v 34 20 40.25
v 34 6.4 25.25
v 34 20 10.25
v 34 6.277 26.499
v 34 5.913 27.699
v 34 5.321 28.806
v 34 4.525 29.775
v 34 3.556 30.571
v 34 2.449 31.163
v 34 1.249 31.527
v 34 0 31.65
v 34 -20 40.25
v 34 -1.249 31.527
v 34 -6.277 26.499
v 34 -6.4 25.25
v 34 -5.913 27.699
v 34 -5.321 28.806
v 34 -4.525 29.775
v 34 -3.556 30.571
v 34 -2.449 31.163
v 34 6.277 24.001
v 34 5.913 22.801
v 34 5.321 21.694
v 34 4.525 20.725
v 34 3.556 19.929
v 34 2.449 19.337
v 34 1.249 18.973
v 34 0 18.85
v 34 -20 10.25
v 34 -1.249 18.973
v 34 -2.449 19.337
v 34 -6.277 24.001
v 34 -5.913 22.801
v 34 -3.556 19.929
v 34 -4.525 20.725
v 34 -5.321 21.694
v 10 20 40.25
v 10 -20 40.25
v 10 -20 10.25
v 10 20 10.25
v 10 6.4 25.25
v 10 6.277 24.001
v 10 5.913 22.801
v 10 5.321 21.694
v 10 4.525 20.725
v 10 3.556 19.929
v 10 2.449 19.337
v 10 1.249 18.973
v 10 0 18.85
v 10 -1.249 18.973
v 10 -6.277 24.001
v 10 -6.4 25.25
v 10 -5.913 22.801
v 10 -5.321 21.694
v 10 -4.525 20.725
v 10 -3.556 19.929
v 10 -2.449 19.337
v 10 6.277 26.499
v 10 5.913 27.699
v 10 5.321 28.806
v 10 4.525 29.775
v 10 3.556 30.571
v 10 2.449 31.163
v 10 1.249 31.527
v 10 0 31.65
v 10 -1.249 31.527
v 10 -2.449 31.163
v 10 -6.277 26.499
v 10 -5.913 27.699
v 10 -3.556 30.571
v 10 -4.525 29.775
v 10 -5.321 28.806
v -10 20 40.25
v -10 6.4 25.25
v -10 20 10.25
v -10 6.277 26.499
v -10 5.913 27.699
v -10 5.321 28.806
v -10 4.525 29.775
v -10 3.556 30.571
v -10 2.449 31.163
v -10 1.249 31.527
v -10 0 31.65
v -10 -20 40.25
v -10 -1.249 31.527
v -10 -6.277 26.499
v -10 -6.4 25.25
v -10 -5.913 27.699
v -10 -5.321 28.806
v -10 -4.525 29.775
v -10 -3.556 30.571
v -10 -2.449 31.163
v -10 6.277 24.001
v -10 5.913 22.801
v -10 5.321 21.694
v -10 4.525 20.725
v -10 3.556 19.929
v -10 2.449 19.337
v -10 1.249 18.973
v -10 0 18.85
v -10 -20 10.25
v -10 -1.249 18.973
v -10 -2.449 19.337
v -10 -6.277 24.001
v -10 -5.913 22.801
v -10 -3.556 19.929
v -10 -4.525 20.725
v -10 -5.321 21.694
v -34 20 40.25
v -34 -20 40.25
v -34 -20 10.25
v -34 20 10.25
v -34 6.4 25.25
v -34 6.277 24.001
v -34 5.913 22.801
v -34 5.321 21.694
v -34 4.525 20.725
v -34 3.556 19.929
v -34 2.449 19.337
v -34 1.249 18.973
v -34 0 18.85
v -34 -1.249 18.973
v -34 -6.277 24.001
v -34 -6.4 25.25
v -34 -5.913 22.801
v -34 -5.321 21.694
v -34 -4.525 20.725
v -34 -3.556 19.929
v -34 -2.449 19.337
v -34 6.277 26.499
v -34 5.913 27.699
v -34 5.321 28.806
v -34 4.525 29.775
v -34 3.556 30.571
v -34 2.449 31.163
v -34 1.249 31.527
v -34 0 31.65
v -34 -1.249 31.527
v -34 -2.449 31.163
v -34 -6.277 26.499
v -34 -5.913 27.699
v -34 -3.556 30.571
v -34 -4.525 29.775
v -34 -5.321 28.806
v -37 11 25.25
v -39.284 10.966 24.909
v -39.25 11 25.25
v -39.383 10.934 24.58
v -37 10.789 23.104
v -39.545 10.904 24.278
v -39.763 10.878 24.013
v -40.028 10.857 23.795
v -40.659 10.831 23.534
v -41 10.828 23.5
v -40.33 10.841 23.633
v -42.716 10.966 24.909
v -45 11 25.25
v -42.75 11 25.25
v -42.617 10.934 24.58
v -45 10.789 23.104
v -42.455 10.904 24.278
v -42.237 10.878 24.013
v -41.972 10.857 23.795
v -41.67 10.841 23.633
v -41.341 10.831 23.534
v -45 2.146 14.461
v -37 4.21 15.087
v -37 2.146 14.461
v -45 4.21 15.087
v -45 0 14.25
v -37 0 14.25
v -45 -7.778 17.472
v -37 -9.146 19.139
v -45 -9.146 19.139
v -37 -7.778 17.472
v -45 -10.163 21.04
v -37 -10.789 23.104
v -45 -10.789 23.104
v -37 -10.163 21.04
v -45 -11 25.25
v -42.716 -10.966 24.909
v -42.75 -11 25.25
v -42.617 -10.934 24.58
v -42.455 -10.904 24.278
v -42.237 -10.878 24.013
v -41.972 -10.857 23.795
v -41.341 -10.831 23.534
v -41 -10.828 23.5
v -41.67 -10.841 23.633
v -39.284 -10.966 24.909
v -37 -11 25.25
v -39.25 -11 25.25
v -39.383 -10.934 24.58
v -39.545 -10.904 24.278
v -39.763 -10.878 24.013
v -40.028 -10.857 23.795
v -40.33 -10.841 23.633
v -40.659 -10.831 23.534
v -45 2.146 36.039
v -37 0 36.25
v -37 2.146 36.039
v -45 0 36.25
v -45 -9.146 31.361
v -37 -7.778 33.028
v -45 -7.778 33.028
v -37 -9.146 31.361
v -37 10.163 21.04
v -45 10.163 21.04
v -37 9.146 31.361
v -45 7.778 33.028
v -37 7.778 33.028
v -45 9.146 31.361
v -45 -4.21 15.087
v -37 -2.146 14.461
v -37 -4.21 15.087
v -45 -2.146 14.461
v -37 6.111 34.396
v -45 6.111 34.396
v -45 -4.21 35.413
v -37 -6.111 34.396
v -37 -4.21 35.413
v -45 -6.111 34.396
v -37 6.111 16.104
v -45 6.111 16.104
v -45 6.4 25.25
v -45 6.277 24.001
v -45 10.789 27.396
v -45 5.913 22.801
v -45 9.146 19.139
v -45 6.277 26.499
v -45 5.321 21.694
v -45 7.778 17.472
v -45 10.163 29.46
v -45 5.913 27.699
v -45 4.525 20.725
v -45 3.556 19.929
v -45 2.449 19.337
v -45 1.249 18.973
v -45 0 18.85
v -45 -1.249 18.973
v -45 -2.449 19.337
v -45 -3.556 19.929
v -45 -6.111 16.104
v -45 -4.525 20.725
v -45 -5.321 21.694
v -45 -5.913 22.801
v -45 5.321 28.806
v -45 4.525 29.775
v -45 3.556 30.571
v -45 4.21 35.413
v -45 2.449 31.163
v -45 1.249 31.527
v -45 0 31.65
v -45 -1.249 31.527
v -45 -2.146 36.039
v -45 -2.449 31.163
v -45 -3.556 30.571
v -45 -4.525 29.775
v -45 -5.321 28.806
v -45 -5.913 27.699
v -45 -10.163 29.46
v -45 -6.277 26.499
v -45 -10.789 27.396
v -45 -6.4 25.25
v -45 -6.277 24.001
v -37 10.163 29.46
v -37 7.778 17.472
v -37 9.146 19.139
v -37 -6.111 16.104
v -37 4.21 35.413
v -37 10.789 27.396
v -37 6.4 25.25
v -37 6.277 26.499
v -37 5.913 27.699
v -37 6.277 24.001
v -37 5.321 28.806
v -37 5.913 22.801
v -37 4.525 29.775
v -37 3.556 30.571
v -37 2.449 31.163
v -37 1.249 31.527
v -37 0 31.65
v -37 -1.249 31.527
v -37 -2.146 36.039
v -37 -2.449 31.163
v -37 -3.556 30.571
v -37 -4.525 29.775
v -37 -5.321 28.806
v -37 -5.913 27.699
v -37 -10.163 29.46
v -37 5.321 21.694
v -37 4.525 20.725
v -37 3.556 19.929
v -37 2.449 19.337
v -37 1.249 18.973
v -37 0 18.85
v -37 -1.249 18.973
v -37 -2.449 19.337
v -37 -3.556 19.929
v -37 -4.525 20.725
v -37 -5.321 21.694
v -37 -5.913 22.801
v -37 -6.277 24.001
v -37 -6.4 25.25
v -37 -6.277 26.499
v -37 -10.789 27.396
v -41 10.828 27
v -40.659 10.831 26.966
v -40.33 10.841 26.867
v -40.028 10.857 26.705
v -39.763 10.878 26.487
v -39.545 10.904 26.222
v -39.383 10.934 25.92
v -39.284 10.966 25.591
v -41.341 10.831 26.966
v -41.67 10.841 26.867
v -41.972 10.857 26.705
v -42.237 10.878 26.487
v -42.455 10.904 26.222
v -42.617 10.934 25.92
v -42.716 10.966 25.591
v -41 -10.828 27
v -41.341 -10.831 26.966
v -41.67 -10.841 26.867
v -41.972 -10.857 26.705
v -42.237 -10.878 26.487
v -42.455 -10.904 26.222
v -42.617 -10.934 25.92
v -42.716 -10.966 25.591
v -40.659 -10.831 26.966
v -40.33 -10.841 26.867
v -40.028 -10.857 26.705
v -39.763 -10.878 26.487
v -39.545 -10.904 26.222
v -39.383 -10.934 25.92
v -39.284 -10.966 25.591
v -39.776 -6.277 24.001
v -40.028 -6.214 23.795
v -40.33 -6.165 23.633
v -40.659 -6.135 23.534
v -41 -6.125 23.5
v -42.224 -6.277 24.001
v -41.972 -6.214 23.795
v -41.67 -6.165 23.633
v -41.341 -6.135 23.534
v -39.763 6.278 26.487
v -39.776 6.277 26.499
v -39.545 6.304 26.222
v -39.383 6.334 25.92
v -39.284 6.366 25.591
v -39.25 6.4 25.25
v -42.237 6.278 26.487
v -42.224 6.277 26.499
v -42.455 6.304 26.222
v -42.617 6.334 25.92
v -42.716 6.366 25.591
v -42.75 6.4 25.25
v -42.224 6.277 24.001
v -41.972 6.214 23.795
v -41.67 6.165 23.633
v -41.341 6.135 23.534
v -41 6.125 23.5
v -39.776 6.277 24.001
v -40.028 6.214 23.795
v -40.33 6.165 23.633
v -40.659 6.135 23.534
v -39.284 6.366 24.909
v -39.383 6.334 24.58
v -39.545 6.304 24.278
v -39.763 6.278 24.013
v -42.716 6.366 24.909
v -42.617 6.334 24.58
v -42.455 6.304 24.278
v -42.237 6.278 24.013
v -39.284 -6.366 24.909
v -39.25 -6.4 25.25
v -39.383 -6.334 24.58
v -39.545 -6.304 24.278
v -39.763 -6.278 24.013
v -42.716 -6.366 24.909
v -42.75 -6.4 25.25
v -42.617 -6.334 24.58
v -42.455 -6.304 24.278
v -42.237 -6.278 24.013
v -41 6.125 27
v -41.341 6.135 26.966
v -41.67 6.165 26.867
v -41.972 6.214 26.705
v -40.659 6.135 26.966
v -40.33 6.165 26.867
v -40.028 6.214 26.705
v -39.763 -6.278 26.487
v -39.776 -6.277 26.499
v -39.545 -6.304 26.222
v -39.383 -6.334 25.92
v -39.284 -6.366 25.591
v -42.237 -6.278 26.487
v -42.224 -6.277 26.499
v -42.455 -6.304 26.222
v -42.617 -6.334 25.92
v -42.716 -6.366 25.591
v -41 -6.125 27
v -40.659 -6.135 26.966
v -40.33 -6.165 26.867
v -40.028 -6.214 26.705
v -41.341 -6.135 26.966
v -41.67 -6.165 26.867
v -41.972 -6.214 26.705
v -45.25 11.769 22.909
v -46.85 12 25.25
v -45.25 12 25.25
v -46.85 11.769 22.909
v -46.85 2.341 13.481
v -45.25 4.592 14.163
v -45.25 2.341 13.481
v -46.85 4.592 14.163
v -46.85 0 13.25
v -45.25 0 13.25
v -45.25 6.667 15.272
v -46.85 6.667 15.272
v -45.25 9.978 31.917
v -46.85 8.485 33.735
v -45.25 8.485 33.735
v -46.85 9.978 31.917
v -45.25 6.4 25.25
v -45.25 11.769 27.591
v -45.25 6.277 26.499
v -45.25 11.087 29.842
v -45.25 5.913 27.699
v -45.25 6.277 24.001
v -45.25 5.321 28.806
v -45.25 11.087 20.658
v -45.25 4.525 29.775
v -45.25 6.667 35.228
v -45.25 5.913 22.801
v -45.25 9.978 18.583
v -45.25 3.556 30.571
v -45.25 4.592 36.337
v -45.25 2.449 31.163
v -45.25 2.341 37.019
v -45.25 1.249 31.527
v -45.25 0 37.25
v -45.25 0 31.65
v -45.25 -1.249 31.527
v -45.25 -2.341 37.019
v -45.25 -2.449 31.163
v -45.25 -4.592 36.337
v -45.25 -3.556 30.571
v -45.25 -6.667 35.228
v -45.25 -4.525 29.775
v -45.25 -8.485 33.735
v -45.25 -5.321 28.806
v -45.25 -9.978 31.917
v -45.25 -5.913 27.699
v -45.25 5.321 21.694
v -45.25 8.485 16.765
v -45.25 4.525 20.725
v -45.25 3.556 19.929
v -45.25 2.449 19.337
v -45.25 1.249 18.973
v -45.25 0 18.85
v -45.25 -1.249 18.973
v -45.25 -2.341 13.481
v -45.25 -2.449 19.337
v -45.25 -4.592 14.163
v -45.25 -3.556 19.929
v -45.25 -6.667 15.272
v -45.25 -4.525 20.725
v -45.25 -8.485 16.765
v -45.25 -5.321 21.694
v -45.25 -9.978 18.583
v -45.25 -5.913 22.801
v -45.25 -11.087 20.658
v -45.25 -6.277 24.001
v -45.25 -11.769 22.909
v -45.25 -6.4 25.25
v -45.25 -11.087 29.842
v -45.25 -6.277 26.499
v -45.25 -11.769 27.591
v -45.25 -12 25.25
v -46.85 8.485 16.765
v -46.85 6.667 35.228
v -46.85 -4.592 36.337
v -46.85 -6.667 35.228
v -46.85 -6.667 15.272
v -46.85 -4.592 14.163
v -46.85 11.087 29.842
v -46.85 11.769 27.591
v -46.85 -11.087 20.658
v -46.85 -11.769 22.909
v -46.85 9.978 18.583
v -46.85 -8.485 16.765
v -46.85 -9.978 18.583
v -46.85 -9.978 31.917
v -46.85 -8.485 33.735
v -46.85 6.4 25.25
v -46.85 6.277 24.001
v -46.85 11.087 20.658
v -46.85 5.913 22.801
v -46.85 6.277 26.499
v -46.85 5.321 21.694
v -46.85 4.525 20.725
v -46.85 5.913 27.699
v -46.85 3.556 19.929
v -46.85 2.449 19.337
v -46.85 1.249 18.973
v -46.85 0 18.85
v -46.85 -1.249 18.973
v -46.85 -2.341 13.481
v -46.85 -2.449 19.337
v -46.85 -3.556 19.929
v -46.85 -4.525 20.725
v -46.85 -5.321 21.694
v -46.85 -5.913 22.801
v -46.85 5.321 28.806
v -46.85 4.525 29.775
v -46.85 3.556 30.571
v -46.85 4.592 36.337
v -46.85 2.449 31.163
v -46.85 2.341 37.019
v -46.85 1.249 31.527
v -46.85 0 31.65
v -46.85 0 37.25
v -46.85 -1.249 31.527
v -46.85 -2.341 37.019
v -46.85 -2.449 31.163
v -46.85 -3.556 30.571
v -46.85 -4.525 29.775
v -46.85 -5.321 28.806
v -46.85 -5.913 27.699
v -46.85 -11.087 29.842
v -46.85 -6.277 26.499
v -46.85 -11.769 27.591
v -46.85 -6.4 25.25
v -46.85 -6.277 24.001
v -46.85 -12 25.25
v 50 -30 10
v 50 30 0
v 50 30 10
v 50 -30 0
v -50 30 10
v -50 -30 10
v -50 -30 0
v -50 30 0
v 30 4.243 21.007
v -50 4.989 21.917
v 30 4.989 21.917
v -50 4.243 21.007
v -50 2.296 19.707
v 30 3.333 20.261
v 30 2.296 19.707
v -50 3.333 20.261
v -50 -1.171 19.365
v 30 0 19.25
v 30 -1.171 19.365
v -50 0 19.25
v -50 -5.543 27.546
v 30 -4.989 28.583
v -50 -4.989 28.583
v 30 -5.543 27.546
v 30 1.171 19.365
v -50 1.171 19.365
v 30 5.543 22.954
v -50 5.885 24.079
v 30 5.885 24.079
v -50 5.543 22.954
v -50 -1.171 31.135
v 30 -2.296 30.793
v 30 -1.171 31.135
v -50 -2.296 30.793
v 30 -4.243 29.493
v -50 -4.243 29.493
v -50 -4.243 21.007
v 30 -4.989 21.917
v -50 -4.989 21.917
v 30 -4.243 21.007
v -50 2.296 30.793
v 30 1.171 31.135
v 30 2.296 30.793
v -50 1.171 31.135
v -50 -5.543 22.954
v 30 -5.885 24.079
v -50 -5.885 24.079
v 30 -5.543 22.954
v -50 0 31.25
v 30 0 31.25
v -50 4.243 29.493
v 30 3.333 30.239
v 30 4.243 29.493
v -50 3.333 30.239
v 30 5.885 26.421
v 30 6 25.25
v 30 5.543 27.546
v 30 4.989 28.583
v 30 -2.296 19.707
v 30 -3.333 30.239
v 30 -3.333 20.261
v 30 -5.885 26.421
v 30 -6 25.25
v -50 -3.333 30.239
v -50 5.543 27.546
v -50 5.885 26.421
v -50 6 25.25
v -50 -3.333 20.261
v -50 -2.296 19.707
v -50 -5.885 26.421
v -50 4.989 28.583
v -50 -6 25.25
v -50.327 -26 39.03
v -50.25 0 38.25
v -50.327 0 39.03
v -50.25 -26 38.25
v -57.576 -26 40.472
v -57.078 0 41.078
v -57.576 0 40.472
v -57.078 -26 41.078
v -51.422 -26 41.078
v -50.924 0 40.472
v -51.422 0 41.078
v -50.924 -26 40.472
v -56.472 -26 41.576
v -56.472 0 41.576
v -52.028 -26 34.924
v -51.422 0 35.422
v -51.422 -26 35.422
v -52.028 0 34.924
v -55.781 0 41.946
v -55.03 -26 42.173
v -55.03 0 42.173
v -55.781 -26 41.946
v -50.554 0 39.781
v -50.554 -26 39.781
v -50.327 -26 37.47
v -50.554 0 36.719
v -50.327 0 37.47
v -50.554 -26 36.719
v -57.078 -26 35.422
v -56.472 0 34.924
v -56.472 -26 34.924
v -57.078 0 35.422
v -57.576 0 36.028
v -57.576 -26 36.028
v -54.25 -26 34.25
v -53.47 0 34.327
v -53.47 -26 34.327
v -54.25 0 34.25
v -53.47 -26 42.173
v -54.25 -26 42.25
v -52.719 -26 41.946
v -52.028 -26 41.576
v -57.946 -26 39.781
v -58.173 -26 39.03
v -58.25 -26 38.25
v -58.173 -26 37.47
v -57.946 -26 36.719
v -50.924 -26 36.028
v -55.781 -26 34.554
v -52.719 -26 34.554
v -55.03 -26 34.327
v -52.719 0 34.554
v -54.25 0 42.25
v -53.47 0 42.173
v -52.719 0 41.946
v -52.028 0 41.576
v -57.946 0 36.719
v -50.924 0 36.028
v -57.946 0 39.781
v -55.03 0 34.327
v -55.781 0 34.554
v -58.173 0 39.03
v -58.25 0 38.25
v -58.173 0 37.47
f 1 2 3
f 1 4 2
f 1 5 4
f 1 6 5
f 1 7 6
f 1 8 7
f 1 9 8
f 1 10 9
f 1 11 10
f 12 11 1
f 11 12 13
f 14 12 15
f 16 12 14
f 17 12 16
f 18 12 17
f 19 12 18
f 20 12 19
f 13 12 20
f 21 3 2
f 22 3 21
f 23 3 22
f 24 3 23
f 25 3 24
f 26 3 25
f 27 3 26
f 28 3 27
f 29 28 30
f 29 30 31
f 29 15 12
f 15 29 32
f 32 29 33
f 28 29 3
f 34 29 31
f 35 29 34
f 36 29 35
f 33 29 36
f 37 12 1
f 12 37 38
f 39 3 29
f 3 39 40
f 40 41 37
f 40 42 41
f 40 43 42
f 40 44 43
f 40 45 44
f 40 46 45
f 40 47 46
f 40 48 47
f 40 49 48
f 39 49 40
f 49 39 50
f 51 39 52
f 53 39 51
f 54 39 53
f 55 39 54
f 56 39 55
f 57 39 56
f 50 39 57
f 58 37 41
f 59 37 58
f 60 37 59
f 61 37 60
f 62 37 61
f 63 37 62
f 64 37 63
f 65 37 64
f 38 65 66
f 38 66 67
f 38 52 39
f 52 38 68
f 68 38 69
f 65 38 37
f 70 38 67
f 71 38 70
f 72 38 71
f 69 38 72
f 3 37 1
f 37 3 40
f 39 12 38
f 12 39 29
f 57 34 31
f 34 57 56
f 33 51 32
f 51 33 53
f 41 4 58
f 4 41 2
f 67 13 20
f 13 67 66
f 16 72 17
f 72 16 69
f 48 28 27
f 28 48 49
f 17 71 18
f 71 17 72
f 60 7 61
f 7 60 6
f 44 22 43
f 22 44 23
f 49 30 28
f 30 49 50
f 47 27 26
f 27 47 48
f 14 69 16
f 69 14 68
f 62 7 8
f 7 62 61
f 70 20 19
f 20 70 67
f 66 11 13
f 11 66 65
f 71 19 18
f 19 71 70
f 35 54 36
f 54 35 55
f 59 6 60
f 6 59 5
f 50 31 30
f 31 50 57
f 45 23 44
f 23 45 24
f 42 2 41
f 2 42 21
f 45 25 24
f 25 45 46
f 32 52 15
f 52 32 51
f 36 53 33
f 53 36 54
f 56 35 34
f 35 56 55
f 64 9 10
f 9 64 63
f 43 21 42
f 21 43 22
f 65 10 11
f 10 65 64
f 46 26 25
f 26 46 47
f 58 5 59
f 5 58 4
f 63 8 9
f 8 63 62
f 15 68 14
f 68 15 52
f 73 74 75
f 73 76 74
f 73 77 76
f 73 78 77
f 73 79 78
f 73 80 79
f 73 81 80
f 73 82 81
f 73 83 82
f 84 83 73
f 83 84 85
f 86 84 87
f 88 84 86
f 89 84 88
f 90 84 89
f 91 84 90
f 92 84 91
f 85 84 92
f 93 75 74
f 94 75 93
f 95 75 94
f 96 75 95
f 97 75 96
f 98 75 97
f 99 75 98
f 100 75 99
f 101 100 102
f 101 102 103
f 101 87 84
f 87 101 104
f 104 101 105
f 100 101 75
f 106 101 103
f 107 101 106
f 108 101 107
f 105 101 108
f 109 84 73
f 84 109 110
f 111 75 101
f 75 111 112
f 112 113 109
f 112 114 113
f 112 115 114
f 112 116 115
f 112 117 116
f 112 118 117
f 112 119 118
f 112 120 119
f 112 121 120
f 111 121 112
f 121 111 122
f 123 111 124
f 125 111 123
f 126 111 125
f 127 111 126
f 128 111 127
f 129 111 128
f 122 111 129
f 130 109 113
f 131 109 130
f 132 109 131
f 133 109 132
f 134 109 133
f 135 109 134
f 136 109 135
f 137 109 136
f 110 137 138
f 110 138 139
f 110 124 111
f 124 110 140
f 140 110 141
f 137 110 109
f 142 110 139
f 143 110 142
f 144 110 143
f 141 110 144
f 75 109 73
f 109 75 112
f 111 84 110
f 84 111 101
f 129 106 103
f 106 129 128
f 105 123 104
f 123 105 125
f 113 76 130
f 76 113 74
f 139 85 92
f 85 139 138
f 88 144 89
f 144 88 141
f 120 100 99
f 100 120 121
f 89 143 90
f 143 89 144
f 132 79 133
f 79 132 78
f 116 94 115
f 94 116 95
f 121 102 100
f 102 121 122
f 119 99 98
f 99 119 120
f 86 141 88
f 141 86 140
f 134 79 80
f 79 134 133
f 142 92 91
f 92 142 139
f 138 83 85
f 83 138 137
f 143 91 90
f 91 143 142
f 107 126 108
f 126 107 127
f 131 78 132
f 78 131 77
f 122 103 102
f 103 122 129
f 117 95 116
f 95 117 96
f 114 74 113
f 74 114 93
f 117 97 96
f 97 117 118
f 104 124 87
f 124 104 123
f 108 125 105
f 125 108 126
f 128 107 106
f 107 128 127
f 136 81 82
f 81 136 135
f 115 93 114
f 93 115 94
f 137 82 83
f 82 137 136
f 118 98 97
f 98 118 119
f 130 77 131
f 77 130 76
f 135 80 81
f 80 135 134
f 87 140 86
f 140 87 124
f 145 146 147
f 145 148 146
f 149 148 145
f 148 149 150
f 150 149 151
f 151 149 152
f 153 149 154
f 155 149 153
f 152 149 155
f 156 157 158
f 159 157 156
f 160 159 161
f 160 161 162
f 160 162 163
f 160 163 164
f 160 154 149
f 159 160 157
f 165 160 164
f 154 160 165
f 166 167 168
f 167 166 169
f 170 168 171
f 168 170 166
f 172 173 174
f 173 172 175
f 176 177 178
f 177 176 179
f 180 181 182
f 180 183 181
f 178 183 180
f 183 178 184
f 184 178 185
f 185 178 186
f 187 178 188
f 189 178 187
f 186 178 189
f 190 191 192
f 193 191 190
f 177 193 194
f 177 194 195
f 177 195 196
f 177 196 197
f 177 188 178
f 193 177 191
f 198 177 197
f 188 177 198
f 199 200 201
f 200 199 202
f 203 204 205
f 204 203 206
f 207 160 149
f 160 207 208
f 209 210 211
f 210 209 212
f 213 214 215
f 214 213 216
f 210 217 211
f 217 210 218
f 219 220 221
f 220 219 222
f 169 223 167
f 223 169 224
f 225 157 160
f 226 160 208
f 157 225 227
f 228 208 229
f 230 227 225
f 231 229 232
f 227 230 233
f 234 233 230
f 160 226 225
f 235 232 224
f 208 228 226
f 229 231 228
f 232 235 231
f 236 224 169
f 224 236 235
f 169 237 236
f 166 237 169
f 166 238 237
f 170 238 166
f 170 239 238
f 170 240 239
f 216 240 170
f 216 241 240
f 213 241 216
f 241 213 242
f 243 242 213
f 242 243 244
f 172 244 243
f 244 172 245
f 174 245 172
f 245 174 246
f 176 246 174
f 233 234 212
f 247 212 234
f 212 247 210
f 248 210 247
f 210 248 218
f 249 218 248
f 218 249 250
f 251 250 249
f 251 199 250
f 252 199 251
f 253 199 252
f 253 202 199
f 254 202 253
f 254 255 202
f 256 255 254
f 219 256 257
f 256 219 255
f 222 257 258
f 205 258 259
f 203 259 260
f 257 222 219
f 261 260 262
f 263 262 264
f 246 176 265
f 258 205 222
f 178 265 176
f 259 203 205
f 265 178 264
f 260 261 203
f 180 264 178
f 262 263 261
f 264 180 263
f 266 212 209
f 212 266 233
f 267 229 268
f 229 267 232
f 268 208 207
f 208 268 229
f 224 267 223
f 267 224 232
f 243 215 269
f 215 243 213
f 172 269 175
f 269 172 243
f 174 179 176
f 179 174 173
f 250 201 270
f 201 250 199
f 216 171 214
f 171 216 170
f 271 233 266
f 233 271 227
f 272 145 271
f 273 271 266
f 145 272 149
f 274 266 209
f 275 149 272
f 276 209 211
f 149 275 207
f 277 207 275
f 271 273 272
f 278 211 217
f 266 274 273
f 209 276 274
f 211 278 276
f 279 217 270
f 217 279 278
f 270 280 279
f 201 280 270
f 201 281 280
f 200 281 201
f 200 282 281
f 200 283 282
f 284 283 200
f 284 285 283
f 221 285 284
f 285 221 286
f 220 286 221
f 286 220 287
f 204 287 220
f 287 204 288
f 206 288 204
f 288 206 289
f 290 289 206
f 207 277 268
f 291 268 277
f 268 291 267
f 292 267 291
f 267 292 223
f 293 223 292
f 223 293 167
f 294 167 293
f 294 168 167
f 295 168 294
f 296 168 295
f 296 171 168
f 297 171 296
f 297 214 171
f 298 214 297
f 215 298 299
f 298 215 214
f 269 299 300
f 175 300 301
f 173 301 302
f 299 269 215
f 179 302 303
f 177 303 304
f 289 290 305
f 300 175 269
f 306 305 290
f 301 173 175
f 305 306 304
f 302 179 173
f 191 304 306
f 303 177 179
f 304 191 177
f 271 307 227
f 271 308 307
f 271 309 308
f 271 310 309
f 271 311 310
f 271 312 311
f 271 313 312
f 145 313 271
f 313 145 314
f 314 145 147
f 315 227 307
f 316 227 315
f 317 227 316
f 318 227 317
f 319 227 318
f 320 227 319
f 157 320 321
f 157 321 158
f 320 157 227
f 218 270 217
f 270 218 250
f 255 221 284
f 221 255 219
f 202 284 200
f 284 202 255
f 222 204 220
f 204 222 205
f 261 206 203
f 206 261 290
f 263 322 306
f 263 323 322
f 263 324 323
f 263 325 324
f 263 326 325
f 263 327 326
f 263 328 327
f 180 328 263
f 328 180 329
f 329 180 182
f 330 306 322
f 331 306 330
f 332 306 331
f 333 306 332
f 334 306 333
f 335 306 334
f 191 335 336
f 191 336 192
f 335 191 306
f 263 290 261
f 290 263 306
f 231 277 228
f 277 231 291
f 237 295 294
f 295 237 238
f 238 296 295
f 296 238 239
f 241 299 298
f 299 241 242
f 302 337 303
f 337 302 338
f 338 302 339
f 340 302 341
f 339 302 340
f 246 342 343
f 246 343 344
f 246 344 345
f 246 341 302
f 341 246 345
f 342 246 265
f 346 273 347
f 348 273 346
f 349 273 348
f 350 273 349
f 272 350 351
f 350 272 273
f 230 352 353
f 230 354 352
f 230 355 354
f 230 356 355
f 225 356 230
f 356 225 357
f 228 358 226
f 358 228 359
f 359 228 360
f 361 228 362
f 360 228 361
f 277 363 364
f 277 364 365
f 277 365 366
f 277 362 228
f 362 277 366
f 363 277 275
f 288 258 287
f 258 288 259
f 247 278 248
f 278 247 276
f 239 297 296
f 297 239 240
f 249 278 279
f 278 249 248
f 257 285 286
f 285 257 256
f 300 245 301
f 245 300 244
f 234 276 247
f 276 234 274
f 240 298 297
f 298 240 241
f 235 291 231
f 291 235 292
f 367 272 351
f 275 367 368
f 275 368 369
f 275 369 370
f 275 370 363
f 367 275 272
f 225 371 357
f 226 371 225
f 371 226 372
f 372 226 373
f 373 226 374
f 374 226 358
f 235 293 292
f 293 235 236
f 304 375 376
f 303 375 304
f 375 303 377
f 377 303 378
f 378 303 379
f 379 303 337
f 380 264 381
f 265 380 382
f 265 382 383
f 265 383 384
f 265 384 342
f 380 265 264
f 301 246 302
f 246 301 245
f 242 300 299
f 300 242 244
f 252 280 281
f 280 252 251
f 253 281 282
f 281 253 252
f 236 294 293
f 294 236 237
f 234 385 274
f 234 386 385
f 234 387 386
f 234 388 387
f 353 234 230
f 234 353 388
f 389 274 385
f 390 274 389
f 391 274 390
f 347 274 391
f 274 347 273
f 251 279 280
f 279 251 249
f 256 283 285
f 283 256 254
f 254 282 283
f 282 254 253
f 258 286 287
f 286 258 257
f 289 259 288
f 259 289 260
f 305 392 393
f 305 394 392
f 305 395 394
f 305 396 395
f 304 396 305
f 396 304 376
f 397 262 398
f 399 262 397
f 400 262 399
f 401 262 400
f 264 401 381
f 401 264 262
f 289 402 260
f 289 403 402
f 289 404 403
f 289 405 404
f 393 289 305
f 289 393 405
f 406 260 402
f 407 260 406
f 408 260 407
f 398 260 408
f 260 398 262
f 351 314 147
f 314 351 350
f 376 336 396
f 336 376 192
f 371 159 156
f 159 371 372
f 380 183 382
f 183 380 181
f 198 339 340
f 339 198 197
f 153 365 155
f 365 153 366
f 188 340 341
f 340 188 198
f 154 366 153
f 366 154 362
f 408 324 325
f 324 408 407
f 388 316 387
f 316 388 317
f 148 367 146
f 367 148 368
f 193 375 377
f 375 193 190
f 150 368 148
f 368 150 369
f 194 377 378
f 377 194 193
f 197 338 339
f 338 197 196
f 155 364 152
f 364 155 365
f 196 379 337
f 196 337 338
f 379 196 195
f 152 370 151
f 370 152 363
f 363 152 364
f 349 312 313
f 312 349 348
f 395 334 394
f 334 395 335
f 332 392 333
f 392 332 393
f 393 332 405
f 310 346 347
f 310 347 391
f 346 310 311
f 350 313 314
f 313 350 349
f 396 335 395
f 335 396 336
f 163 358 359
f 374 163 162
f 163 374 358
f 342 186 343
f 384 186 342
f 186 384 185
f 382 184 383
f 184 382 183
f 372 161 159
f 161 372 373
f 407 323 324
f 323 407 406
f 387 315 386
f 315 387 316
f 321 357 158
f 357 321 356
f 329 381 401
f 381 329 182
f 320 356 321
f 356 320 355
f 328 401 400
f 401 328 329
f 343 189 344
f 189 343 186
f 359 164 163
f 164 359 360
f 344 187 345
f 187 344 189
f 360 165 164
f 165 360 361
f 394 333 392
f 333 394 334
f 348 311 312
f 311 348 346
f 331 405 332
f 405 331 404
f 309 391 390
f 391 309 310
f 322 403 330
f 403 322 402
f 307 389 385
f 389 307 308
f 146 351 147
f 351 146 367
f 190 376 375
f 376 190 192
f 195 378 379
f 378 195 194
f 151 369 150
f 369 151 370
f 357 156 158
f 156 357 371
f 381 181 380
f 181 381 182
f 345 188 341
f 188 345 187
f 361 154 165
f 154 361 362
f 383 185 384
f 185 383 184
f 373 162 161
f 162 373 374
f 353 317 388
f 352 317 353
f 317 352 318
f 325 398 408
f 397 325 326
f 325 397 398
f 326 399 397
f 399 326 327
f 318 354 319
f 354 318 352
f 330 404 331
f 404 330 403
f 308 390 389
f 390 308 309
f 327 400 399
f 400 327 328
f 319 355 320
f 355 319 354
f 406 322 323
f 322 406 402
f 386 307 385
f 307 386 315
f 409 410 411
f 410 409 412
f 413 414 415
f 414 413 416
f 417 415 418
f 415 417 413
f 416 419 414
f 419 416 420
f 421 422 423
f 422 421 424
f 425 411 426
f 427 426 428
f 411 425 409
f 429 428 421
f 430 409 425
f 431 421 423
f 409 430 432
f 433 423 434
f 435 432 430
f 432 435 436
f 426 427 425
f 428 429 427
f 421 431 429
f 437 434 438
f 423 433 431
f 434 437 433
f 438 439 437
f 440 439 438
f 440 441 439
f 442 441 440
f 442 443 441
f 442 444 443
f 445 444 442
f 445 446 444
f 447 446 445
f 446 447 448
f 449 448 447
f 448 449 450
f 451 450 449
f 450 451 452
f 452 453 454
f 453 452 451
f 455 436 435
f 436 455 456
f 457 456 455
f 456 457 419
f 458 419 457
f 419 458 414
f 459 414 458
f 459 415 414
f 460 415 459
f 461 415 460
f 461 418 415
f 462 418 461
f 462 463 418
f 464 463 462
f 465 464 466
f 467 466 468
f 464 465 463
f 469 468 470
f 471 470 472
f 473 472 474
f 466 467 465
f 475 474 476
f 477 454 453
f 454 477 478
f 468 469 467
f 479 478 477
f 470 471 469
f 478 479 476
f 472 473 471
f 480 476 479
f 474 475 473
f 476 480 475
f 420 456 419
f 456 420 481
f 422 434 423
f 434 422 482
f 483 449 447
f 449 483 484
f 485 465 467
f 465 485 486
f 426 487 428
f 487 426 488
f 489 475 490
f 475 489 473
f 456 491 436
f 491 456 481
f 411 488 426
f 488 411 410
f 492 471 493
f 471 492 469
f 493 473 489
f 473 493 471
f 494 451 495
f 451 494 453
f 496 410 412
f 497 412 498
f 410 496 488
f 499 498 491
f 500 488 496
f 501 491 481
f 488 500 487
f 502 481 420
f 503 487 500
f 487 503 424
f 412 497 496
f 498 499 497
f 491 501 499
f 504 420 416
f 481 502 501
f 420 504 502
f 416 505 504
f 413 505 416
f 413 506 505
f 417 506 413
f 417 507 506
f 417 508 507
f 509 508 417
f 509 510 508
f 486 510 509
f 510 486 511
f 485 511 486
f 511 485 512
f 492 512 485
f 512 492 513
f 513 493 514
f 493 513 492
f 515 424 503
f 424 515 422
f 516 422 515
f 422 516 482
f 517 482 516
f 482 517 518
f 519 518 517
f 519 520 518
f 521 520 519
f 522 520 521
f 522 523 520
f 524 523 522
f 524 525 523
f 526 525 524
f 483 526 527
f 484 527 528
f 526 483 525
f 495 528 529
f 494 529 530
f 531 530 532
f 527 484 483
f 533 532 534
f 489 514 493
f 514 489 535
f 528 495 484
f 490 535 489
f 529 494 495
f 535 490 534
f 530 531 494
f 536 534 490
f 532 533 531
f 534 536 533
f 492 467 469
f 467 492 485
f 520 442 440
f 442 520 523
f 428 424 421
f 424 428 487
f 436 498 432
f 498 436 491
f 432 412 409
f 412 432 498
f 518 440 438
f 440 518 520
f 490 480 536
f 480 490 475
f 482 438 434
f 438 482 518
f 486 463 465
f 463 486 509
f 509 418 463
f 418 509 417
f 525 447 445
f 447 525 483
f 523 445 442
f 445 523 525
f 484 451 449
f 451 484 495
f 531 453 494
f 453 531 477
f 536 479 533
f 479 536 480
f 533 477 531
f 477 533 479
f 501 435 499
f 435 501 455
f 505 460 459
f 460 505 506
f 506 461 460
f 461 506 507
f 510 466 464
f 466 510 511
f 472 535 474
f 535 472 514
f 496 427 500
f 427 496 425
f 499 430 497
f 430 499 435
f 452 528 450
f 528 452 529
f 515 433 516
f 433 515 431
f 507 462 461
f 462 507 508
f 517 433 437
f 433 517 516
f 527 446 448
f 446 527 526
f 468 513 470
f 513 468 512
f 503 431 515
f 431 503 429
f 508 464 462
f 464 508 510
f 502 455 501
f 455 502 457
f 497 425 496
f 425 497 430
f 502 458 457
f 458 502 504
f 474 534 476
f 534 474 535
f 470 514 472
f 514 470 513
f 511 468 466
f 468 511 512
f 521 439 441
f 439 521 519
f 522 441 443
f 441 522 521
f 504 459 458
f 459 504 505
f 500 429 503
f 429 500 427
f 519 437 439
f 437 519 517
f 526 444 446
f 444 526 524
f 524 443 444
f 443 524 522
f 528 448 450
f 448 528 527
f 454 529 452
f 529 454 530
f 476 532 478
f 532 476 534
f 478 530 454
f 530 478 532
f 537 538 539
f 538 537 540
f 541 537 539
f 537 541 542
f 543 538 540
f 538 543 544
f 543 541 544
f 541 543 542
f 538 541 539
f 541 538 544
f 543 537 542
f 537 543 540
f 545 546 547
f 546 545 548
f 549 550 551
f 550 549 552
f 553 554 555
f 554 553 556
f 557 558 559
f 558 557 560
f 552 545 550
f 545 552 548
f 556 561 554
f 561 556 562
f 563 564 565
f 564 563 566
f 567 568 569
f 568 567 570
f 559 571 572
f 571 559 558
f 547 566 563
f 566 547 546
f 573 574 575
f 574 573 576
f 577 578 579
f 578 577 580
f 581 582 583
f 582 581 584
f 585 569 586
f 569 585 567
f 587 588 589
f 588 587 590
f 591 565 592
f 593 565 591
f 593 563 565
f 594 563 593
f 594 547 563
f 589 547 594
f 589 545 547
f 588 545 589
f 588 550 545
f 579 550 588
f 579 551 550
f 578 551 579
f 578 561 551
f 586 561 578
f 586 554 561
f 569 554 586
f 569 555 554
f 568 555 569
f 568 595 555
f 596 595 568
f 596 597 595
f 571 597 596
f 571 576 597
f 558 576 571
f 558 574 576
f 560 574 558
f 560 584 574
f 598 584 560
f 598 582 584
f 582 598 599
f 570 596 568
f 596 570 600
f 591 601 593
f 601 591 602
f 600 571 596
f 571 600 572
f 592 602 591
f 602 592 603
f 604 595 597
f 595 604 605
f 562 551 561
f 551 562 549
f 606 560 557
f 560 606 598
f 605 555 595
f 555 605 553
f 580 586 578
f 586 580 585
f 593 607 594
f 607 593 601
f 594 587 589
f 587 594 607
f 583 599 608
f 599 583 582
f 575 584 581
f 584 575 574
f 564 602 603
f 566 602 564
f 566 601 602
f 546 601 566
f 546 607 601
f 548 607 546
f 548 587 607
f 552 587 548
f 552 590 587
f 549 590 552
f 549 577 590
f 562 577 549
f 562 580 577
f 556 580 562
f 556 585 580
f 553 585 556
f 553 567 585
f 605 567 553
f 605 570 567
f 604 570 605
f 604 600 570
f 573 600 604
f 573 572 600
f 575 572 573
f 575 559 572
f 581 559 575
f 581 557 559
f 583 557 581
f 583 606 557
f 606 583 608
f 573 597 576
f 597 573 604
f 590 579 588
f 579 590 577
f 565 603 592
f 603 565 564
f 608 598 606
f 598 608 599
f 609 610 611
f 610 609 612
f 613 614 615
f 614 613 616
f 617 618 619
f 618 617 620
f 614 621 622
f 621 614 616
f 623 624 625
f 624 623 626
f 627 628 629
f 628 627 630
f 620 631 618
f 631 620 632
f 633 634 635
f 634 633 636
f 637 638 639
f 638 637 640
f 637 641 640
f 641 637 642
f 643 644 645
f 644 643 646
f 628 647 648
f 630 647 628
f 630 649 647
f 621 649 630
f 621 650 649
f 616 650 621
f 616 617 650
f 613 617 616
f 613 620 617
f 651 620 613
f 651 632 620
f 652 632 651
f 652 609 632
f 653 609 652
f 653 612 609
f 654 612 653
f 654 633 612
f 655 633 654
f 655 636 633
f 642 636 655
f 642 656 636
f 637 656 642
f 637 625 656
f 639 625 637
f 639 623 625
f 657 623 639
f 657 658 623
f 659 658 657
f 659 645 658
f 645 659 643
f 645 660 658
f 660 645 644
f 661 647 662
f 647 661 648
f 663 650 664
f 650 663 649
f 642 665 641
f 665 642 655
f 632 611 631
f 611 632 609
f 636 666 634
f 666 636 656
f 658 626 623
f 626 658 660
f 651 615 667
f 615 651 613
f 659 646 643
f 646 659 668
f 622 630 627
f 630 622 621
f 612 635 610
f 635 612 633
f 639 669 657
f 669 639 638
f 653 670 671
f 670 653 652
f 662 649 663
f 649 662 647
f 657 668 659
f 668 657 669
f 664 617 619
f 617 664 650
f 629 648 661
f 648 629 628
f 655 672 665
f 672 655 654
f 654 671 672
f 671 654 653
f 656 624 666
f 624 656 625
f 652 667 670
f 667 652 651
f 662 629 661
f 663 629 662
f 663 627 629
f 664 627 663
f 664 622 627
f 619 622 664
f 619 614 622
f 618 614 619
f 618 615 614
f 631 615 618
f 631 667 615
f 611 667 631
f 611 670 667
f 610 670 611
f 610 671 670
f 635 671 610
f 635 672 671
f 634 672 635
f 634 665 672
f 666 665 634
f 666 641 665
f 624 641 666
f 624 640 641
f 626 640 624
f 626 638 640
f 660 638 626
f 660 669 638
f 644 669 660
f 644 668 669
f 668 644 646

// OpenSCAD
$fn = 32;

// ------------------------------------------------------------------------
// Machine vise: screw d12, jaws 24 x 30 mm
// Every part is its own module, assembly() places every instance.
// ------------------------------------------------------------------------

// --- part 1 ---
module vise_bed() {
  difference() {
    translate([-50, -30, 0]) cube([100, 60, 10]);
  }
}

// --- part 2 ---
module vise_jaw() {
  difference() {
    translate([-12, -20, 0]) cube([24, 40, 30]);
    translate([0, 0, 15]) rotate([0, 90, 0]) cylinder(h = 26, d = 12.8, center = true);
  }
}

// --- part 3 ---
module vise_screw() {
  translate([0, 0, -40]) cylinder(h = 80, d = 12);
}

// --- part 4 ---
module screw_collar() {
  difference() {
    cylinder(h = 8, d = 22);
    translate([0, 0, -1]) cylinder(h = 10, d = 12.8);
    translate([0, 0, 4]) rotate([90, 0, 0]) cylinder(h = 24, d = 3.5, center = true);
  }
}

// --- part 5 ---
module screw_washer() {
  difference() {
      translate([0, 0, 0]) cylinder(h = 1.6, d = 24);
      translate([0, 0, -1]) cylinder(h = 3.6, d = 12.8);
    }
}

// --- part 6 ---
module vise_handle() {
  cylinder(h = 26, d = 8);
}

// --- assembly ---
module assembly() {
  color([0.80, 0.24, 0.20]) translate([0, 0, 0]) rotate([0, 0, 0]) vise_bed();
  color([0.20, 0.45, 0.75]) translate([22, 0, 10.25]) rotate([0, 0, 0]) vise_jaw();
  color([0.25, 0.62, 0.32]) translate([-22, 0, 10.25]) rotate([0, 0, 0]) vise_jaw();
  color([0.92, 0.70, 0.18]) translate([-10, 0, 25.25]) rotate([0, 90, 0]) vise_screw();
  color([0.58, 0.35, 0.70]) translate([-45, 0, 25.25]) rotate([0, 90, 0]) screw_collar();
  color([0.16, 0.66, 0.66]) translate([-46.85, 0, 25.25]) rotate([0, 90, 0]) screw_washer();
  color([0.85, 0.48, 0.18]) translate([-54.25, 0, 38.25]) rotate([90, 0, 0]) vise_handle();
}

assembly();
